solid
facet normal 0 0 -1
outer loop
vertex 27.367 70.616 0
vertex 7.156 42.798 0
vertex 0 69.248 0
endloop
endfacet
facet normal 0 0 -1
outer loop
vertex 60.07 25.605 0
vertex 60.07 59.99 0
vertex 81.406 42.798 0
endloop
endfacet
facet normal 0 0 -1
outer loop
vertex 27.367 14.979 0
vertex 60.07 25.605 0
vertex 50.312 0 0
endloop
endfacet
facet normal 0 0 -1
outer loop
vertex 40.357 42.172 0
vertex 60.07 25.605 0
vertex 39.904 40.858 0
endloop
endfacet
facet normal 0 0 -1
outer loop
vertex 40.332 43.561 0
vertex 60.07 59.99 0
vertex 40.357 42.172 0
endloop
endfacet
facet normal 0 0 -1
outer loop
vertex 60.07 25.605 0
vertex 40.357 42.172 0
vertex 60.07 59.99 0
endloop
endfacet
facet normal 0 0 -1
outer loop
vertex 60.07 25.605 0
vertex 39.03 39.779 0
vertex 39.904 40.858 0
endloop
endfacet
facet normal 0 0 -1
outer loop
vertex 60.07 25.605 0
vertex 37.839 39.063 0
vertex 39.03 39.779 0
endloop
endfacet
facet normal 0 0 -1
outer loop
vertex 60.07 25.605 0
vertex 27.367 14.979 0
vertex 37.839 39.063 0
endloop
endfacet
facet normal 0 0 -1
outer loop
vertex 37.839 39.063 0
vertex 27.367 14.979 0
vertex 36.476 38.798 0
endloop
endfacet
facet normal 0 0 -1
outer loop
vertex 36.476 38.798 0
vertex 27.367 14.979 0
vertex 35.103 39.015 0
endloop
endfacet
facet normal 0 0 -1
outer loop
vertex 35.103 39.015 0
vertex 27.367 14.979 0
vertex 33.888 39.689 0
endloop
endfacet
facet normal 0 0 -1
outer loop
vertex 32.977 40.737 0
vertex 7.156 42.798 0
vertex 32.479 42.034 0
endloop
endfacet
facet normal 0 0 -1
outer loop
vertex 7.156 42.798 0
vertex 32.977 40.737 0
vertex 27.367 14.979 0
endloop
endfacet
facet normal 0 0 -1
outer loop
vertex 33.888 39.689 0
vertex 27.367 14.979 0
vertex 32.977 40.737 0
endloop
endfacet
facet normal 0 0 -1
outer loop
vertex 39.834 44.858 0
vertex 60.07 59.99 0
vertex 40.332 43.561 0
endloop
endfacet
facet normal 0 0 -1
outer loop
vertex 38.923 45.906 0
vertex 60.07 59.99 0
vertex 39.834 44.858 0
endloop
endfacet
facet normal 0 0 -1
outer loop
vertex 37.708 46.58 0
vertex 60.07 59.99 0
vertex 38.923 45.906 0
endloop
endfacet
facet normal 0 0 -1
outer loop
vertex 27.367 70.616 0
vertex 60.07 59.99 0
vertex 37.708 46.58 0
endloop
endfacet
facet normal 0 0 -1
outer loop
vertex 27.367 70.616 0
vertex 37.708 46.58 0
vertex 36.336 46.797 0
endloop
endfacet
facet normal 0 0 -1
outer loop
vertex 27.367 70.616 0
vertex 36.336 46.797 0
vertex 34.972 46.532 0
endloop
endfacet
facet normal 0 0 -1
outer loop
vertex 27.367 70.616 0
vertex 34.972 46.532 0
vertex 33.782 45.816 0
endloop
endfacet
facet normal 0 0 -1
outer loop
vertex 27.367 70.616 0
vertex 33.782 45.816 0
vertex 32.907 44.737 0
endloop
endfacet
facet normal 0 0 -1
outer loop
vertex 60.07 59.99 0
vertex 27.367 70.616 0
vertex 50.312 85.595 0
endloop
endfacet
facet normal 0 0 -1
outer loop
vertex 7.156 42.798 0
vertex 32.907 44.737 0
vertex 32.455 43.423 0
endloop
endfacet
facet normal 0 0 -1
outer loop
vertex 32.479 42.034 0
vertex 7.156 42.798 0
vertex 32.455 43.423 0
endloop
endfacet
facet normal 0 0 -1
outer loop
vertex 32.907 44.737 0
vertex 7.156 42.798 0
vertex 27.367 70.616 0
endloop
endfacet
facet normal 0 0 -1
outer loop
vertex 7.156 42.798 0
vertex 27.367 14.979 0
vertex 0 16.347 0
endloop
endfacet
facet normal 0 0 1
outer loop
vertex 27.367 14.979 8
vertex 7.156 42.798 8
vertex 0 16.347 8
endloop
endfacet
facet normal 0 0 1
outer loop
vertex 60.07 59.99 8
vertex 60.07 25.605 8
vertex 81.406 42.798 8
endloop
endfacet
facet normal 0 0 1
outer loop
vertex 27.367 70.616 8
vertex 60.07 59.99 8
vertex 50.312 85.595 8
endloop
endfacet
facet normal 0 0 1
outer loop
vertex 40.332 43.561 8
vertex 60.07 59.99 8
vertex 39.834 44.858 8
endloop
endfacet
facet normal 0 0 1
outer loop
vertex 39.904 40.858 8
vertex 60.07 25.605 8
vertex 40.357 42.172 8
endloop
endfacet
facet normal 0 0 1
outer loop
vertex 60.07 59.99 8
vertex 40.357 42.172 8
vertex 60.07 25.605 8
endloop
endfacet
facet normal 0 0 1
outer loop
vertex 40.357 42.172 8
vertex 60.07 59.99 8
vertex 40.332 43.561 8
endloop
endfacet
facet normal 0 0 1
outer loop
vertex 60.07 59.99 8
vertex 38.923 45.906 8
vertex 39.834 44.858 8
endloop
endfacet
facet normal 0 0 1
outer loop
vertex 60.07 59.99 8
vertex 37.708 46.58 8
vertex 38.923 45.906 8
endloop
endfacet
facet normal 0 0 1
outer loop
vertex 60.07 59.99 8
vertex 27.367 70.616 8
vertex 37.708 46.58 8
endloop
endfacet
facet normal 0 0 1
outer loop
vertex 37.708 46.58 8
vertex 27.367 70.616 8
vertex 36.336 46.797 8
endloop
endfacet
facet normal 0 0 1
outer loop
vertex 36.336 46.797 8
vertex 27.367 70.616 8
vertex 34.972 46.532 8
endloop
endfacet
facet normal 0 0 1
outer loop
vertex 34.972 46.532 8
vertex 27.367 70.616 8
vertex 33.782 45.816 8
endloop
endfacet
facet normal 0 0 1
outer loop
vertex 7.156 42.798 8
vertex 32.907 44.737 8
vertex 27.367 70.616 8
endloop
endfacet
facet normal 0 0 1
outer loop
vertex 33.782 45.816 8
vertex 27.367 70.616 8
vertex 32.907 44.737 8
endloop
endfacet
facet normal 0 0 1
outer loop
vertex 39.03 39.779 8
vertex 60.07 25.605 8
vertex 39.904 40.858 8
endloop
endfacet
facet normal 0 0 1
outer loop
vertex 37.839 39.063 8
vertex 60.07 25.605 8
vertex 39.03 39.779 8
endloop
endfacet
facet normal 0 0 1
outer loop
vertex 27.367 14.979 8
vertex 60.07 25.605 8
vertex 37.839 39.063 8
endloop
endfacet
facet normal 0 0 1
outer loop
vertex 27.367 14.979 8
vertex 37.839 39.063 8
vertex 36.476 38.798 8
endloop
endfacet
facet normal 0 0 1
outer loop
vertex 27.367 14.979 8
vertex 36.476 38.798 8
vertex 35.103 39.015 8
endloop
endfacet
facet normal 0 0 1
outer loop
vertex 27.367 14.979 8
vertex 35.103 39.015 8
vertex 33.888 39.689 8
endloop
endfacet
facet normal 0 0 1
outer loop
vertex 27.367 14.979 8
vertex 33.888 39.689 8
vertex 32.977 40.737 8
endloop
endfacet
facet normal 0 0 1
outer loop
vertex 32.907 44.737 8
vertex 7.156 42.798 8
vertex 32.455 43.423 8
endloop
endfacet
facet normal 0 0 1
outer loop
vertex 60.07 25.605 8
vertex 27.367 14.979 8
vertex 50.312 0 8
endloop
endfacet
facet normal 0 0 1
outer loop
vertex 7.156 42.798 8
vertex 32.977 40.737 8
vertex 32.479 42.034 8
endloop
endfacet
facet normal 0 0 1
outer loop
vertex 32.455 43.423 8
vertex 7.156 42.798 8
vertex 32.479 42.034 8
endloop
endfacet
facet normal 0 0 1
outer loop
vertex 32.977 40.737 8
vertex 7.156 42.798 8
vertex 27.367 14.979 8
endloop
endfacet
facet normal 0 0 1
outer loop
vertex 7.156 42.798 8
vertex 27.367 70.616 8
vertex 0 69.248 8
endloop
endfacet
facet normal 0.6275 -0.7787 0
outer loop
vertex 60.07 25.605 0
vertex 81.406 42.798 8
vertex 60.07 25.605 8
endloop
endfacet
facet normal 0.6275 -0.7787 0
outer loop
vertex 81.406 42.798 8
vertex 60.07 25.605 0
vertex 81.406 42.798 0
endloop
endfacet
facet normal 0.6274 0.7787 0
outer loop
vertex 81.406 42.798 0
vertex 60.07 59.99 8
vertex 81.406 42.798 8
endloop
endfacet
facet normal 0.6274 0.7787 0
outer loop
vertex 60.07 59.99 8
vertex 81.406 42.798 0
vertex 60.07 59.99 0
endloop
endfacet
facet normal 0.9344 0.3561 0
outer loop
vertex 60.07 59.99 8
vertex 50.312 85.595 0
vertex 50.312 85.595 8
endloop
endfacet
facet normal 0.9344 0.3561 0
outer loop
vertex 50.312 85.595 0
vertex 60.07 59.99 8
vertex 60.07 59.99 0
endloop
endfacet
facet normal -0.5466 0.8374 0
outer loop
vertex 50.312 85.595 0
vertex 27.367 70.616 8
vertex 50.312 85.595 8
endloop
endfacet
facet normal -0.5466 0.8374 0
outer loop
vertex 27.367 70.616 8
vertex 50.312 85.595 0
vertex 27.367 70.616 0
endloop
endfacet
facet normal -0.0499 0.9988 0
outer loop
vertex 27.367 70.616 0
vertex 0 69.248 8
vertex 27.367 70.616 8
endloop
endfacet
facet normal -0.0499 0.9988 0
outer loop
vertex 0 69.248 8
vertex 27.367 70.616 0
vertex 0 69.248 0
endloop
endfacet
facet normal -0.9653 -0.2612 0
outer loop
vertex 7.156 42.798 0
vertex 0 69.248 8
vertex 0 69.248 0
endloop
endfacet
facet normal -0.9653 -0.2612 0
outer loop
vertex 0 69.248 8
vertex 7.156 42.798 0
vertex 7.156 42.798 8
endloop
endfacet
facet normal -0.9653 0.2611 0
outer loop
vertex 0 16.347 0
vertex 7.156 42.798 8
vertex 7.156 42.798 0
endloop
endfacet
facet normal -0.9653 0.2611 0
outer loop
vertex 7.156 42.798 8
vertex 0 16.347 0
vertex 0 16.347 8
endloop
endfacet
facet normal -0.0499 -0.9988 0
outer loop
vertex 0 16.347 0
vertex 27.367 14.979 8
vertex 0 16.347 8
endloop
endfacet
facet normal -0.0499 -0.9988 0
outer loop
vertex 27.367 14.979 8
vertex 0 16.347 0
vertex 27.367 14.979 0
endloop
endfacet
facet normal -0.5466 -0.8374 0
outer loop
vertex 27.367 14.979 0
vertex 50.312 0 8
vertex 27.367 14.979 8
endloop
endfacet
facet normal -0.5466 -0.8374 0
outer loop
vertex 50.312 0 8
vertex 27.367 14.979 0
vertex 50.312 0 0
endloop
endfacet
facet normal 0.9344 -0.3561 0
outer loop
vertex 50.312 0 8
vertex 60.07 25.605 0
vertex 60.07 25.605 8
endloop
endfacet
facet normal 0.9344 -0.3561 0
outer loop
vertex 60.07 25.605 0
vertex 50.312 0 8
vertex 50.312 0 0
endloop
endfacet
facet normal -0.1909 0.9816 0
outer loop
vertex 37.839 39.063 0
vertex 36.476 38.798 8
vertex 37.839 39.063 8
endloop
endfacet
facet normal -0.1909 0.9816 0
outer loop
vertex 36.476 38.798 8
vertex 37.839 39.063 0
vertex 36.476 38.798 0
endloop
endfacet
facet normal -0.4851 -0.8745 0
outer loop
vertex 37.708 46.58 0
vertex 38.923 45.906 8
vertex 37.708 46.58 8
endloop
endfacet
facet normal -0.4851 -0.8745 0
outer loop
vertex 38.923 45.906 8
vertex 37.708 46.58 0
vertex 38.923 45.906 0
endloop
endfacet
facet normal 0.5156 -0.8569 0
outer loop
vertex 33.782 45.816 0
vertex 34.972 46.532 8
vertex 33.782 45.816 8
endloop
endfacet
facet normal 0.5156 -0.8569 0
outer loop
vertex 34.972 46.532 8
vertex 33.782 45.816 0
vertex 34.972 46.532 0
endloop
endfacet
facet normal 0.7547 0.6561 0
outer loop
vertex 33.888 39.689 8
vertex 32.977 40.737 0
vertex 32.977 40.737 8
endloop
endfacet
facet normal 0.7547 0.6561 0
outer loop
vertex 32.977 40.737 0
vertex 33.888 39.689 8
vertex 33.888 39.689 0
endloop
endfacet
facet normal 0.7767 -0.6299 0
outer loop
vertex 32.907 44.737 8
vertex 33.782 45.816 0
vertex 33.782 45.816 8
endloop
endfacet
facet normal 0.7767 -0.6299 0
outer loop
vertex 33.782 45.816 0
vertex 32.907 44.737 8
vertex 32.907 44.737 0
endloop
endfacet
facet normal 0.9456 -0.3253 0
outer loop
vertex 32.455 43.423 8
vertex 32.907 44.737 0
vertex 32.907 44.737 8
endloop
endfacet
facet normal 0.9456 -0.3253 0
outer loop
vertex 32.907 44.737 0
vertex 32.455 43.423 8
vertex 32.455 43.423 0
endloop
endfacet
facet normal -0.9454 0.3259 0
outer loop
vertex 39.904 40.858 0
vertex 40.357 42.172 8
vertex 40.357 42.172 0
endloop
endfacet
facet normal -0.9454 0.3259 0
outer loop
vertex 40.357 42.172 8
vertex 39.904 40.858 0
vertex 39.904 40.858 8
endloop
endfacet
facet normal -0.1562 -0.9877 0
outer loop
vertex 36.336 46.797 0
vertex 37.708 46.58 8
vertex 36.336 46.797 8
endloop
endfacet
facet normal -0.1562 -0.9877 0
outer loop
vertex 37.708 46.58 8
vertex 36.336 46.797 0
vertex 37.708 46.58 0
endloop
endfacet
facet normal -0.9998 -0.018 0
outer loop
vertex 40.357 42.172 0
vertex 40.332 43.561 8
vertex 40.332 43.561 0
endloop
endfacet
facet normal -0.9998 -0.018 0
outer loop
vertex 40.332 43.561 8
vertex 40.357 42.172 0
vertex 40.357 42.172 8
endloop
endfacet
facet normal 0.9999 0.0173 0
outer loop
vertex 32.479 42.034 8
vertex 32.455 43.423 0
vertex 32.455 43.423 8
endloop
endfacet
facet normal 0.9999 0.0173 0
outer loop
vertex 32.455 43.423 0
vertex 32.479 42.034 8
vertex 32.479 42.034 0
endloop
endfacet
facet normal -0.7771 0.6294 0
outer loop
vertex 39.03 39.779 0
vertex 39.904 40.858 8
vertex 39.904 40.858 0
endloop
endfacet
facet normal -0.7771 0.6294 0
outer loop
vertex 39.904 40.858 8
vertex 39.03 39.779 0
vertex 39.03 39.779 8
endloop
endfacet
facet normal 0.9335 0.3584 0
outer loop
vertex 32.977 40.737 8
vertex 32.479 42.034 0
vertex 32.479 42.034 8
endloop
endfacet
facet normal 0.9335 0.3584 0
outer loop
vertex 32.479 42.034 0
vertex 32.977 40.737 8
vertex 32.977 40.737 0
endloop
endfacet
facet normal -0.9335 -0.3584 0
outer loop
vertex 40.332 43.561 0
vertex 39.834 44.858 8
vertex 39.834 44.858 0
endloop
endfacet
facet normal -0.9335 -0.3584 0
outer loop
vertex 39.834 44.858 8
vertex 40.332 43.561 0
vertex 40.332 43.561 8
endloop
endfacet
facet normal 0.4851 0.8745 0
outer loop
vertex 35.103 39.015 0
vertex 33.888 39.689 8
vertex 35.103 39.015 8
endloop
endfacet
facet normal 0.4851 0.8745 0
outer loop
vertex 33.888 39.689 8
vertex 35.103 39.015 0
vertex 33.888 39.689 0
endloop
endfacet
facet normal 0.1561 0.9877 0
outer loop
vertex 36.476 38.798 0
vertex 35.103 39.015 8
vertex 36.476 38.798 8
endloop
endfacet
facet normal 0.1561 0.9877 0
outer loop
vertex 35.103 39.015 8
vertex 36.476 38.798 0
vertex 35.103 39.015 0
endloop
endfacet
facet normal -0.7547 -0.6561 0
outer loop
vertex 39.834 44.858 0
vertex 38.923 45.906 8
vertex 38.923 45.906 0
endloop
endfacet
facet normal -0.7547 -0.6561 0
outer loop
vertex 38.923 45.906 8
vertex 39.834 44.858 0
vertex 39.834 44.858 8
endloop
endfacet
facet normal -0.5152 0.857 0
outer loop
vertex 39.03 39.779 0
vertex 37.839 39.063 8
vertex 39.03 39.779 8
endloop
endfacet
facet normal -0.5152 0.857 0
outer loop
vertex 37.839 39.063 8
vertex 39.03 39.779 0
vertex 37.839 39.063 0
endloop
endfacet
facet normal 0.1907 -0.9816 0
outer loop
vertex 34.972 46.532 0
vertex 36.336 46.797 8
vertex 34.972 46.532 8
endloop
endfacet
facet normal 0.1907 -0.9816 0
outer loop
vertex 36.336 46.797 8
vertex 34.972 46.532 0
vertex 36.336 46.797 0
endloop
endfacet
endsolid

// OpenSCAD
$fn = 32;

// ----------------------------------------------------------------------
// Star wheel: 5-point blunt, R45
// ----------------------------------------------------------------------

// --- parameters (mm) ---
n_points = 5;             // number of points / teeth
r_out = 45;               // tip radius
r_in = 29.25;             // root radius
bore_r = 4;               // centre bore radius
plate_t = 8;              // plate thickness, Z (extrusion height)
bore_d = 8;               // centre bore diameter
fit_tol = 0.1;            // declared fit tolerance (prompt contract)
free_tol = 0.3;           // declared free tolerance (prompt contract)

profile = [[81.406, 42.798], [60.07, 59.99], [50.312, 85.595], [27.367, 70.616], [0, 69.248], [7.156, 42.798], [0, 16.347], [27.367, 14.979], [50.312, 0], [60.07, 25.605]];  // primary outline, 10 points, counter clockwise
void_1 = [[40.332, 43.561], [39.834, 44.858], [38.923, 45.906], [37.708, 46.58], [36.336, 46.797], [34.972, 46.532], [33.782, 45.816], [32.907, 44.737], [32.455, 43.423], [32.479, 42.034], [32.977, 40.737], [33.888, 39.689], [35.103, 39.015], [36.476, 38.798], [37.839, 39.063], [39.03, 39.779], [39.904, 40.858], [40.357, 42.172]];  // centre bore, 18 points

// --- the one profile operation ---
difference() {
  linear_extrude(height = plate_t) polygon(points = profile);
  translate([0, 0, -1])
    linear_extrude(height = plate_t + 2) polygon(points = void_1);
}
